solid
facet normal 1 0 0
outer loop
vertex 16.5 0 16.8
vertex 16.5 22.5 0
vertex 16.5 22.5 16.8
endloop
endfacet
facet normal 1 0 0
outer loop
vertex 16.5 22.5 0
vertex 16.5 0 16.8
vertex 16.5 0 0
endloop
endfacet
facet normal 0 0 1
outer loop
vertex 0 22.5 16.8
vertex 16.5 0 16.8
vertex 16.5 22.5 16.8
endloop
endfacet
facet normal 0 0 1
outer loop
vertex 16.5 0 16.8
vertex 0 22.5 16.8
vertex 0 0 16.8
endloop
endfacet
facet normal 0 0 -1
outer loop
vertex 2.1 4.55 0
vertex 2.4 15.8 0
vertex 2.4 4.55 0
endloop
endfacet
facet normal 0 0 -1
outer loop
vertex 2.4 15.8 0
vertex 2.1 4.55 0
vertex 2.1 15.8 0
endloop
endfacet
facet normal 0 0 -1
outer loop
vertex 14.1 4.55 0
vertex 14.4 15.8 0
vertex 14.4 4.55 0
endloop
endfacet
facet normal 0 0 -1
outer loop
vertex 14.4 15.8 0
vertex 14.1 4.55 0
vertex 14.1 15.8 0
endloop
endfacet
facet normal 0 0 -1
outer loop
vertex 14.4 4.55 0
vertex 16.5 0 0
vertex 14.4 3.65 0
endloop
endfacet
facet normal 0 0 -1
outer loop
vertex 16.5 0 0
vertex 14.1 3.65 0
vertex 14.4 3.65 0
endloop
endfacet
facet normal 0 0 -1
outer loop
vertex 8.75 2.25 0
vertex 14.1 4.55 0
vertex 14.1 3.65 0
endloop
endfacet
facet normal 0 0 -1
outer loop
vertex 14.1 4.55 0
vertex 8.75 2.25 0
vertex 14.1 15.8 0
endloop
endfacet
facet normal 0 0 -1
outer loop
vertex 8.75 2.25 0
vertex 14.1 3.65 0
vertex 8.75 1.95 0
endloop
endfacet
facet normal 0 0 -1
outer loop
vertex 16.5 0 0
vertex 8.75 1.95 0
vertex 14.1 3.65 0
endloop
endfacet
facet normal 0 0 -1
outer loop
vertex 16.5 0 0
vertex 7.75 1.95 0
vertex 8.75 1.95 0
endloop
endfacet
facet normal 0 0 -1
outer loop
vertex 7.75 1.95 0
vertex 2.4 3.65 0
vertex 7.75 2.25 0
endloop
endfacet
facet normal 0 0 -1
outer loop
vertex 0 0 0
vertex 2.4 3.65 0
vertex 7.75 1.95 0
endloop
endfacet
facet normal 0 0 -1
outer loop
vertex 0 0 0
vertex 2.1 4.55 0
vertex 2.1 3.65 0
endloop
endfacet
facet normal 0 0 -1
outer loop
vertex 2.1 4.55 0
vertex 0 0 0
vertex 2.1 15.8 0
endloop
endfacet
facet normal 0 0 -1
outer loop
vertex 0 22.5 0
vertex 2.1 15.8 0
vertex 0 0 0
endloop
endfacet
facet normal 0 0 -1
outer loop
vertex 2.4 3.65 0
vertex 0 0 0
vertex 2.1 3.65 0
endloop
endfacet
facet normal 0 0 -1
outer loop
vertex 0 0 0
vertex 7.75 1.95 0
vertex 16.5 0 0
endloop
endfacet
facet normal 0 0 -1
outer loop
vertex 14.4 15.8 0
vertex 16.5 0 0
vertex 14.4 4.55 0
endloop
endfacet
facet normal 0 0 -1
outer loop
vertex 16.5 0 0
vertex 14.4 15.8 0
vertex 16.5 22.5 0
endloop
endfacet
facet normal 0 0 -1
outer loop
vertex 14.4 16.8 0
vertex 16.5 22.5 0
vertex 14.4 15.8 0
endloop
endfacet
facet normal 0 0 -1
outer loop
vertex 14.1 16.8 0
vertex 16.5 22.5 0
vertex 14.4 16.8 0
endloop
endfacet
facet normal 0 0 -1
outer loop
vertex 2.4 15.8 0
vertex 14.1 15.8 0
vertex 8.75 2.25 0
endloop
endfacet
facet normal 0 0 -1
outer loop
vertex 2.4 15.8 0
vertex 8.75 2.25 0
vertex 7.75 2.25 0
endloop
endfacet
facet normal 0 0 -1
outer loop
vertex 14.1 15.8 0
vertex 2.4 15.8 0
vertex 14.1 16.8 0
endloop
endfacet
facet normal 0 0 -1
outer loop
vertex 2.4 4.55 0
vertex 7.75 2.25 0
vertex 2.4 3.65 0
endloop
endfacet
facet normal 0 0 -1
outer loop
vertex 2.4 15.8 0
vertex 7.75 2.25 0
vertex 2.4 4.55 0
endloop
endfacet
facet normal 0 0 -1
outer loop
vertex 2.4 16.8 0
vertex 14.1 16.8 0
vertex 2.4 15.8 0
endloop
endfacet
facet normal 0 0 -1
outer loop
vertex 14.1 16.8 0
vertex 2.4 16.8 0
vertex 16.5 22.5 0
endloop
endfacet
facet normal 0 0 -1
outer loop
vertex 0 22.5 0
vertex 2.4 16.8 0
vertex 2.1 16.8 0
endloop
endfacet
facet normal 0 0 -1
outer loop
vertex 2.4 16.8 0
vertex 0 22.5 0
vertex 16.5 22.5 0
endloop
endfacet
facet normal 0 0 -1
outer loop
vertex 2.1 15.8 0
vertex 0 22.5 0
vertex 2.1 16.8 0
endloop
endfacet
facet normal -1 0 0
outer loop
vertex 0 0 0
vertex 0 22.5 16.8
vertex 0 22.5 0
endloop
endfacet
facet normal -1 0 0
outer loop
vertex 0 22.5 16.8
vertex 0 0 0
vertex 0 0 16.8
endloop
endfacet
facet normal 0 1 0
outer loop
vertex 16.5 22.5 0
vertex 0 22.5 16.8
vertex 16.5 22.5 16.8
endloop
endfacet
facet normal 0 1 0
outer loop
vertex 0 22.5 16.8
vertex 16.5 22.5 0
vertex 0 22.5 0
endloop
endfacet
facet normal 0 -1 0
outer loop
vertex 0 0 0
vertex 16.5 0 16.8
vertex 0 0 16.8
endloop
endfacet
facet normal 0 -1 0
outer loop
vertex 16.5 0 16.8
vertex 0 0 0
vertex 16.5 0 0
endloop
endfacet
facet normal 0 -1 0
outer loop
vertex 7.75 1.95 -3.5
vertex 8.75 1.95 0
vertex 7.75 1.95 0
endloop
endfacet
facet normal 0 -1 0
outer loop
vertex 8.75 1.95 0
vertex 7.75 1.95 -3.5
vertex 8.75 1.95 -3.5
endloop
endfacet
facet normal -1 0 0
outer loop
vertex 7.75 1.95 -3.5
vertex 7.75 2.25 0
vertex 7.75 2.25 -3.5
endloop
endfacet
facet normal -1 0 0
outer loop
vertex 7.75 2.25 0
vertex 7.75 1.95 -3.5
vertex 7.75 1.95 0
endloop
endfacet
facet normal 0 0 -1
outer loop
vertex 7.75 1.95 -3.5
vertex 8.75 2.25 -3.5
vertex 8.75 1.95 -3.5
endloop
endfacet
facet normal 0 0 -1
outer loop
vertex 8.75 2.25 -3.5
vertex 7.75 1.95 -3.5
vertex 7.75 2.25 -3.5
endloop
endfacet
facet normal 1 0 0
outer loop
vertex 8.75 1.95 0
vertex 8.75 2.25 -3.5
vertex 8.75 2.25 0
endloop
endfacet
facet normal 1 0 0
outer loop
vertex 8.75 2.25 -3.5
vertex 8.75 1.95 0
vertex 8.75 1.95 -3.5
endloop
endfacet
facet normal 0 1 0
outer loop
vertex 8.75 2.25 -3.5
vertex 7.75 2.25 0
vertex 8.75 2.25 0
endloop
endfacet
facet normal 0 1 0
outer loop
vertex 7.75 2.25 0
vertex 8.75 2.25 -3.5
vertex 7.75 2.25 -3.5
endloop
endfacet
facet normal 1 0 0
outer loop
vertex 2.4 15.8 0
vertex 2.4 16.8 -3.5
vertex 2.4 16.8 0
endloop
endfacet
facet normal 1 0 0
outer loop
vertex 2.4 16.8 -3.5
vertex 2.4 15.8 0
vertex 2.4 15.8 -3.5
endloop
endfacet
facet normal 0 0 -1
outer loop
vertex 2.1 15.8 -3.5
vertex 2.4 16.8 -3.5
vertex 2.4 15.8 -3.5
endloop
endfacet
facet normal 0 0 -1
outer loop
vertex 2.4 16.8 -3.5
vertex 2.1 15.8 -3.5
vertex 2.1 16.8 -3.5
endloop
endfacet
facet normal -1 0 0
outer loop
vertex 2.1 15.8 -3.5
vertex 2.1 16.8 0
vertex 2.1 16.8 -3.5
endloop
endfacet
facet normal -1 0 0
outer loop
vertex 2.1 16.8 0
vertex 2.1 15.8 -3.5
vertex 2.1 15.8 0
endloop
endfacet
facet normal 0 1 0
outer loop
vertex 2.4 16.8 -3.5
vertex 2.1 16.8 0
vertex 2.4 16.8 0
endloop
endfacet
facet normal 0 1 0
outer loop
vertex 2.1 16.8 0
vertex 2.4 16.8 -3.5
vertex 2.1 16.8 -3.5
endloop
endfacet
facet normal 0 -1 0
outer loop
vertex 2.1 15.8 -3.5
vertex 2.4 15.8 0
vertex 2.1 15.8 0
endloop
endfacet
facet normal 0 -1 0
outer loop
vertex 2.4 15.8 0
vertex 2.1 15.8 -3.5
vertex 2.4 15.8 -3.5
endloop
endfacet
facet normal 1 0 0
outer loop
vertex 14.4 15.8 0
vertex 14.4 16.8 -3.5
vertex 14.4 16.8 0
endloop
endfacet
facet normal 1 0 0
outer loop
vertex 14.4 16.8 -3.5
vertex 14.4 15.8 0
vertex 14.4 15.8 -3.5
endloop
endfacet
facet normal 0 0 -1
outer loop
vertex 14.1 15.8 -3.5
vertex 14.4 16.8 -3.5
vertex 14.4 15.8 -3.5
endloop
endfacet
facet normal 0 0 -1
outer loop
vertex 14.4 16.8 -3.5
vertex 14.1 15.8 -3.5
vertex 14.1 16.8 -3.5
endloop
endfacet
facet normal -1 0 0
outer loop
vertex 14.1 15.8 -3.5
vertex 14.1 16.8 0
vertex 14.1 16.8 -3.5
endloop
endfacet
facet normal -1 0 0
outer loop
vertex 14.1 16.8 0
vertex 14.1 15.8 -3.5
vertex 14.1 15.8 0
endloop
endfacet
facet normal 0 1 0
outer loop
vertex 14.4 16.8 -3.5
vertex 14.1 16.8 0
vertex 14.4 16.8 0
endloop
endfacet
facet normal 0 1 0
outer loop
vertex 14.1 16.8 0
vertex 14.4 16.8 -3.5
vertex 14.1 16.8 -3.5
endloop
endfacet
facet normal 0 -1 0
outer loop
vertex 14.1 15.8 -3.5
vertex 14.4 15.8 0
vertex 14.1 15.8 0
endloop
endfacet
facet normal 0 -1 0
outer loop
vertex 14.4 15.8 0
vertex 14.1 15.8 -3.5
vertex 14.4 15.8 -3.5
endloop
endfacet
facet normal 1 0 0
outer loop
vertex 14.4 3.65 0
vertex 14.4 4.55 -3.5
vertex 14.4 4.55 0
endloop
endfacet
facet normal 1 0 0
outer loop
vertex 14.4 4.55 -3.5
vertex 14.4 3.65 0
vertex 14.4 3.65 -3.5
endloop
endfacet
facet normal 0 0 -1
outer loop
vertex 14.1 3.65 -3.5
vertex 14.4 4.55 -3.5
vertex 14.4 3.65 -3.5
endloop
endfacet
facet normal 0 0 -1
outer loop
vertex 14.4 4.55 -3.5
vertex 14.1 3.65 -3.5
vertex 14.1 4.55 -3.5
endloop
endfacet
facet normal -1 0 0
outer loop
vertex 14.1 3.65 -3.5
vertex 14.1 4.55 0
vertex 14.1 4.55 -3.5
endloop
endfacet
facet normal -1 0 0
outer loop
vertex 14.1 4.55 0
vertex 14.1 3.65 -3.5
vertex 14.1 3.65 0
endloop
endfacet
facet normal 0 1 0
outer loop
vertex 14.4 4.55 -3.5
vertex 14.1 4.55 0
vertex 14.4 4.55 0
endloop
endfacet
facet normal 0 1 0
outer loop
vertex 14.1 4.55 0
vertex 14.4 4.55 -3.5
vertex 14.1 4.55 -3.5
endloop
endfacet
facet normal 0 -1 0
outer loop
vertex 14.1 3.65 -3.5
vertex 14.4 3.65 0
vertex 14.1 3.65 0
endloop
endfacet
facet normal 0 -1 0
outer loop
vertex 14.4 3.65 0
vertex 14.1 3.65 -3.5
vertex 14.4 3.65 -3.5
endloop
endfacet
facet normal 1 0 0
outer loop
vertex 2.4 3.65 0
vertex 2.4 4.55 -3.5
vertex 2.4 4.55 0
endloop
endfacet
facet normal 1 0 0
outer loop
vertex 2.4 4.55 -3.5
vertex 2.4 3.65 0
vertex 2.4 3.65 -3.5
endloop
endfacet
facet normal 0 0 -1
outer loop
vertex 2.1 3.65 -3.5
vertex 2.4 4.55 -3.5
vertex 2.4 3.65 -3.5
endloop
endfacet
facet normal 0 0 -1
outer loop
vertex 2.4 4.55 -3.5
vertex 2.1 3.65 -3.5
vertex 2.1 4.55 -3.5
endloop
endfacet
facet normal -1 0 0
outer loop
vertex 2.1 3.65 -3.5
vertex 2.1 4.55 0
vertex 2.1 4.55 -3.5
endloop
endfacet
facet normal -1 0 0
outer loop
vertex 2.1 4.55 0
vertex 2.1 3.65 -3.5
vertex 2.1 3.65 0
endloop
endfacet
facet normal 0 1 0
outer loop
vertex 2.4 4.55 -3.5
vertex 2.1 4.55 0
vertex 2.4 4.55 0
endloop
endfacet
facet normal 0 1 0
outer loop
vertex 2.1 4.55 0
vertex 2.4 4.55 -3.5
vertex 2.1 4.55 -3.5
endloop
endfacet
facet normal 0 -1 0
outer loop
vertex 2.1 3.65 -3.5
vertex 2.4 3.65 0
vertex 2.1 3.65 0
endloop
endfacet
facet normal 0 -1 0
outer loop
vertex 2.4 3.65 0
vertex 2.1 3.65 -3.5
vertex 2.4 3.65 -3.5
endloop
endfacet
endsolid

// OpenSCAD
module pin134() {
	cube(size=[0.3, 1.0, 3.5], center=true);
};

module pin25() {
	cube(size=[0.3, 0.9, 3.5], center=true);
};

cube(size=[16.5, 22.5, 16.8]);
translate([(16.5 / 2), 2.1, (-3.5 / 2)]) rotate([0, 0, 90]) pin134();
translate([(16.5 / 2 - 6), 16.3, (-3.5 / 2)]) pin134();
translate([(16.5 / 2 + 6), 16.3, (-3.5 / 2)]) pin134();
translate([(16.5 / 2 + 6), 4.1, (-3.5 / 2)]) pin25();
translate([(16.5 / 2 - 6), 4.1, (-3.5 / 2)]) pin25();
